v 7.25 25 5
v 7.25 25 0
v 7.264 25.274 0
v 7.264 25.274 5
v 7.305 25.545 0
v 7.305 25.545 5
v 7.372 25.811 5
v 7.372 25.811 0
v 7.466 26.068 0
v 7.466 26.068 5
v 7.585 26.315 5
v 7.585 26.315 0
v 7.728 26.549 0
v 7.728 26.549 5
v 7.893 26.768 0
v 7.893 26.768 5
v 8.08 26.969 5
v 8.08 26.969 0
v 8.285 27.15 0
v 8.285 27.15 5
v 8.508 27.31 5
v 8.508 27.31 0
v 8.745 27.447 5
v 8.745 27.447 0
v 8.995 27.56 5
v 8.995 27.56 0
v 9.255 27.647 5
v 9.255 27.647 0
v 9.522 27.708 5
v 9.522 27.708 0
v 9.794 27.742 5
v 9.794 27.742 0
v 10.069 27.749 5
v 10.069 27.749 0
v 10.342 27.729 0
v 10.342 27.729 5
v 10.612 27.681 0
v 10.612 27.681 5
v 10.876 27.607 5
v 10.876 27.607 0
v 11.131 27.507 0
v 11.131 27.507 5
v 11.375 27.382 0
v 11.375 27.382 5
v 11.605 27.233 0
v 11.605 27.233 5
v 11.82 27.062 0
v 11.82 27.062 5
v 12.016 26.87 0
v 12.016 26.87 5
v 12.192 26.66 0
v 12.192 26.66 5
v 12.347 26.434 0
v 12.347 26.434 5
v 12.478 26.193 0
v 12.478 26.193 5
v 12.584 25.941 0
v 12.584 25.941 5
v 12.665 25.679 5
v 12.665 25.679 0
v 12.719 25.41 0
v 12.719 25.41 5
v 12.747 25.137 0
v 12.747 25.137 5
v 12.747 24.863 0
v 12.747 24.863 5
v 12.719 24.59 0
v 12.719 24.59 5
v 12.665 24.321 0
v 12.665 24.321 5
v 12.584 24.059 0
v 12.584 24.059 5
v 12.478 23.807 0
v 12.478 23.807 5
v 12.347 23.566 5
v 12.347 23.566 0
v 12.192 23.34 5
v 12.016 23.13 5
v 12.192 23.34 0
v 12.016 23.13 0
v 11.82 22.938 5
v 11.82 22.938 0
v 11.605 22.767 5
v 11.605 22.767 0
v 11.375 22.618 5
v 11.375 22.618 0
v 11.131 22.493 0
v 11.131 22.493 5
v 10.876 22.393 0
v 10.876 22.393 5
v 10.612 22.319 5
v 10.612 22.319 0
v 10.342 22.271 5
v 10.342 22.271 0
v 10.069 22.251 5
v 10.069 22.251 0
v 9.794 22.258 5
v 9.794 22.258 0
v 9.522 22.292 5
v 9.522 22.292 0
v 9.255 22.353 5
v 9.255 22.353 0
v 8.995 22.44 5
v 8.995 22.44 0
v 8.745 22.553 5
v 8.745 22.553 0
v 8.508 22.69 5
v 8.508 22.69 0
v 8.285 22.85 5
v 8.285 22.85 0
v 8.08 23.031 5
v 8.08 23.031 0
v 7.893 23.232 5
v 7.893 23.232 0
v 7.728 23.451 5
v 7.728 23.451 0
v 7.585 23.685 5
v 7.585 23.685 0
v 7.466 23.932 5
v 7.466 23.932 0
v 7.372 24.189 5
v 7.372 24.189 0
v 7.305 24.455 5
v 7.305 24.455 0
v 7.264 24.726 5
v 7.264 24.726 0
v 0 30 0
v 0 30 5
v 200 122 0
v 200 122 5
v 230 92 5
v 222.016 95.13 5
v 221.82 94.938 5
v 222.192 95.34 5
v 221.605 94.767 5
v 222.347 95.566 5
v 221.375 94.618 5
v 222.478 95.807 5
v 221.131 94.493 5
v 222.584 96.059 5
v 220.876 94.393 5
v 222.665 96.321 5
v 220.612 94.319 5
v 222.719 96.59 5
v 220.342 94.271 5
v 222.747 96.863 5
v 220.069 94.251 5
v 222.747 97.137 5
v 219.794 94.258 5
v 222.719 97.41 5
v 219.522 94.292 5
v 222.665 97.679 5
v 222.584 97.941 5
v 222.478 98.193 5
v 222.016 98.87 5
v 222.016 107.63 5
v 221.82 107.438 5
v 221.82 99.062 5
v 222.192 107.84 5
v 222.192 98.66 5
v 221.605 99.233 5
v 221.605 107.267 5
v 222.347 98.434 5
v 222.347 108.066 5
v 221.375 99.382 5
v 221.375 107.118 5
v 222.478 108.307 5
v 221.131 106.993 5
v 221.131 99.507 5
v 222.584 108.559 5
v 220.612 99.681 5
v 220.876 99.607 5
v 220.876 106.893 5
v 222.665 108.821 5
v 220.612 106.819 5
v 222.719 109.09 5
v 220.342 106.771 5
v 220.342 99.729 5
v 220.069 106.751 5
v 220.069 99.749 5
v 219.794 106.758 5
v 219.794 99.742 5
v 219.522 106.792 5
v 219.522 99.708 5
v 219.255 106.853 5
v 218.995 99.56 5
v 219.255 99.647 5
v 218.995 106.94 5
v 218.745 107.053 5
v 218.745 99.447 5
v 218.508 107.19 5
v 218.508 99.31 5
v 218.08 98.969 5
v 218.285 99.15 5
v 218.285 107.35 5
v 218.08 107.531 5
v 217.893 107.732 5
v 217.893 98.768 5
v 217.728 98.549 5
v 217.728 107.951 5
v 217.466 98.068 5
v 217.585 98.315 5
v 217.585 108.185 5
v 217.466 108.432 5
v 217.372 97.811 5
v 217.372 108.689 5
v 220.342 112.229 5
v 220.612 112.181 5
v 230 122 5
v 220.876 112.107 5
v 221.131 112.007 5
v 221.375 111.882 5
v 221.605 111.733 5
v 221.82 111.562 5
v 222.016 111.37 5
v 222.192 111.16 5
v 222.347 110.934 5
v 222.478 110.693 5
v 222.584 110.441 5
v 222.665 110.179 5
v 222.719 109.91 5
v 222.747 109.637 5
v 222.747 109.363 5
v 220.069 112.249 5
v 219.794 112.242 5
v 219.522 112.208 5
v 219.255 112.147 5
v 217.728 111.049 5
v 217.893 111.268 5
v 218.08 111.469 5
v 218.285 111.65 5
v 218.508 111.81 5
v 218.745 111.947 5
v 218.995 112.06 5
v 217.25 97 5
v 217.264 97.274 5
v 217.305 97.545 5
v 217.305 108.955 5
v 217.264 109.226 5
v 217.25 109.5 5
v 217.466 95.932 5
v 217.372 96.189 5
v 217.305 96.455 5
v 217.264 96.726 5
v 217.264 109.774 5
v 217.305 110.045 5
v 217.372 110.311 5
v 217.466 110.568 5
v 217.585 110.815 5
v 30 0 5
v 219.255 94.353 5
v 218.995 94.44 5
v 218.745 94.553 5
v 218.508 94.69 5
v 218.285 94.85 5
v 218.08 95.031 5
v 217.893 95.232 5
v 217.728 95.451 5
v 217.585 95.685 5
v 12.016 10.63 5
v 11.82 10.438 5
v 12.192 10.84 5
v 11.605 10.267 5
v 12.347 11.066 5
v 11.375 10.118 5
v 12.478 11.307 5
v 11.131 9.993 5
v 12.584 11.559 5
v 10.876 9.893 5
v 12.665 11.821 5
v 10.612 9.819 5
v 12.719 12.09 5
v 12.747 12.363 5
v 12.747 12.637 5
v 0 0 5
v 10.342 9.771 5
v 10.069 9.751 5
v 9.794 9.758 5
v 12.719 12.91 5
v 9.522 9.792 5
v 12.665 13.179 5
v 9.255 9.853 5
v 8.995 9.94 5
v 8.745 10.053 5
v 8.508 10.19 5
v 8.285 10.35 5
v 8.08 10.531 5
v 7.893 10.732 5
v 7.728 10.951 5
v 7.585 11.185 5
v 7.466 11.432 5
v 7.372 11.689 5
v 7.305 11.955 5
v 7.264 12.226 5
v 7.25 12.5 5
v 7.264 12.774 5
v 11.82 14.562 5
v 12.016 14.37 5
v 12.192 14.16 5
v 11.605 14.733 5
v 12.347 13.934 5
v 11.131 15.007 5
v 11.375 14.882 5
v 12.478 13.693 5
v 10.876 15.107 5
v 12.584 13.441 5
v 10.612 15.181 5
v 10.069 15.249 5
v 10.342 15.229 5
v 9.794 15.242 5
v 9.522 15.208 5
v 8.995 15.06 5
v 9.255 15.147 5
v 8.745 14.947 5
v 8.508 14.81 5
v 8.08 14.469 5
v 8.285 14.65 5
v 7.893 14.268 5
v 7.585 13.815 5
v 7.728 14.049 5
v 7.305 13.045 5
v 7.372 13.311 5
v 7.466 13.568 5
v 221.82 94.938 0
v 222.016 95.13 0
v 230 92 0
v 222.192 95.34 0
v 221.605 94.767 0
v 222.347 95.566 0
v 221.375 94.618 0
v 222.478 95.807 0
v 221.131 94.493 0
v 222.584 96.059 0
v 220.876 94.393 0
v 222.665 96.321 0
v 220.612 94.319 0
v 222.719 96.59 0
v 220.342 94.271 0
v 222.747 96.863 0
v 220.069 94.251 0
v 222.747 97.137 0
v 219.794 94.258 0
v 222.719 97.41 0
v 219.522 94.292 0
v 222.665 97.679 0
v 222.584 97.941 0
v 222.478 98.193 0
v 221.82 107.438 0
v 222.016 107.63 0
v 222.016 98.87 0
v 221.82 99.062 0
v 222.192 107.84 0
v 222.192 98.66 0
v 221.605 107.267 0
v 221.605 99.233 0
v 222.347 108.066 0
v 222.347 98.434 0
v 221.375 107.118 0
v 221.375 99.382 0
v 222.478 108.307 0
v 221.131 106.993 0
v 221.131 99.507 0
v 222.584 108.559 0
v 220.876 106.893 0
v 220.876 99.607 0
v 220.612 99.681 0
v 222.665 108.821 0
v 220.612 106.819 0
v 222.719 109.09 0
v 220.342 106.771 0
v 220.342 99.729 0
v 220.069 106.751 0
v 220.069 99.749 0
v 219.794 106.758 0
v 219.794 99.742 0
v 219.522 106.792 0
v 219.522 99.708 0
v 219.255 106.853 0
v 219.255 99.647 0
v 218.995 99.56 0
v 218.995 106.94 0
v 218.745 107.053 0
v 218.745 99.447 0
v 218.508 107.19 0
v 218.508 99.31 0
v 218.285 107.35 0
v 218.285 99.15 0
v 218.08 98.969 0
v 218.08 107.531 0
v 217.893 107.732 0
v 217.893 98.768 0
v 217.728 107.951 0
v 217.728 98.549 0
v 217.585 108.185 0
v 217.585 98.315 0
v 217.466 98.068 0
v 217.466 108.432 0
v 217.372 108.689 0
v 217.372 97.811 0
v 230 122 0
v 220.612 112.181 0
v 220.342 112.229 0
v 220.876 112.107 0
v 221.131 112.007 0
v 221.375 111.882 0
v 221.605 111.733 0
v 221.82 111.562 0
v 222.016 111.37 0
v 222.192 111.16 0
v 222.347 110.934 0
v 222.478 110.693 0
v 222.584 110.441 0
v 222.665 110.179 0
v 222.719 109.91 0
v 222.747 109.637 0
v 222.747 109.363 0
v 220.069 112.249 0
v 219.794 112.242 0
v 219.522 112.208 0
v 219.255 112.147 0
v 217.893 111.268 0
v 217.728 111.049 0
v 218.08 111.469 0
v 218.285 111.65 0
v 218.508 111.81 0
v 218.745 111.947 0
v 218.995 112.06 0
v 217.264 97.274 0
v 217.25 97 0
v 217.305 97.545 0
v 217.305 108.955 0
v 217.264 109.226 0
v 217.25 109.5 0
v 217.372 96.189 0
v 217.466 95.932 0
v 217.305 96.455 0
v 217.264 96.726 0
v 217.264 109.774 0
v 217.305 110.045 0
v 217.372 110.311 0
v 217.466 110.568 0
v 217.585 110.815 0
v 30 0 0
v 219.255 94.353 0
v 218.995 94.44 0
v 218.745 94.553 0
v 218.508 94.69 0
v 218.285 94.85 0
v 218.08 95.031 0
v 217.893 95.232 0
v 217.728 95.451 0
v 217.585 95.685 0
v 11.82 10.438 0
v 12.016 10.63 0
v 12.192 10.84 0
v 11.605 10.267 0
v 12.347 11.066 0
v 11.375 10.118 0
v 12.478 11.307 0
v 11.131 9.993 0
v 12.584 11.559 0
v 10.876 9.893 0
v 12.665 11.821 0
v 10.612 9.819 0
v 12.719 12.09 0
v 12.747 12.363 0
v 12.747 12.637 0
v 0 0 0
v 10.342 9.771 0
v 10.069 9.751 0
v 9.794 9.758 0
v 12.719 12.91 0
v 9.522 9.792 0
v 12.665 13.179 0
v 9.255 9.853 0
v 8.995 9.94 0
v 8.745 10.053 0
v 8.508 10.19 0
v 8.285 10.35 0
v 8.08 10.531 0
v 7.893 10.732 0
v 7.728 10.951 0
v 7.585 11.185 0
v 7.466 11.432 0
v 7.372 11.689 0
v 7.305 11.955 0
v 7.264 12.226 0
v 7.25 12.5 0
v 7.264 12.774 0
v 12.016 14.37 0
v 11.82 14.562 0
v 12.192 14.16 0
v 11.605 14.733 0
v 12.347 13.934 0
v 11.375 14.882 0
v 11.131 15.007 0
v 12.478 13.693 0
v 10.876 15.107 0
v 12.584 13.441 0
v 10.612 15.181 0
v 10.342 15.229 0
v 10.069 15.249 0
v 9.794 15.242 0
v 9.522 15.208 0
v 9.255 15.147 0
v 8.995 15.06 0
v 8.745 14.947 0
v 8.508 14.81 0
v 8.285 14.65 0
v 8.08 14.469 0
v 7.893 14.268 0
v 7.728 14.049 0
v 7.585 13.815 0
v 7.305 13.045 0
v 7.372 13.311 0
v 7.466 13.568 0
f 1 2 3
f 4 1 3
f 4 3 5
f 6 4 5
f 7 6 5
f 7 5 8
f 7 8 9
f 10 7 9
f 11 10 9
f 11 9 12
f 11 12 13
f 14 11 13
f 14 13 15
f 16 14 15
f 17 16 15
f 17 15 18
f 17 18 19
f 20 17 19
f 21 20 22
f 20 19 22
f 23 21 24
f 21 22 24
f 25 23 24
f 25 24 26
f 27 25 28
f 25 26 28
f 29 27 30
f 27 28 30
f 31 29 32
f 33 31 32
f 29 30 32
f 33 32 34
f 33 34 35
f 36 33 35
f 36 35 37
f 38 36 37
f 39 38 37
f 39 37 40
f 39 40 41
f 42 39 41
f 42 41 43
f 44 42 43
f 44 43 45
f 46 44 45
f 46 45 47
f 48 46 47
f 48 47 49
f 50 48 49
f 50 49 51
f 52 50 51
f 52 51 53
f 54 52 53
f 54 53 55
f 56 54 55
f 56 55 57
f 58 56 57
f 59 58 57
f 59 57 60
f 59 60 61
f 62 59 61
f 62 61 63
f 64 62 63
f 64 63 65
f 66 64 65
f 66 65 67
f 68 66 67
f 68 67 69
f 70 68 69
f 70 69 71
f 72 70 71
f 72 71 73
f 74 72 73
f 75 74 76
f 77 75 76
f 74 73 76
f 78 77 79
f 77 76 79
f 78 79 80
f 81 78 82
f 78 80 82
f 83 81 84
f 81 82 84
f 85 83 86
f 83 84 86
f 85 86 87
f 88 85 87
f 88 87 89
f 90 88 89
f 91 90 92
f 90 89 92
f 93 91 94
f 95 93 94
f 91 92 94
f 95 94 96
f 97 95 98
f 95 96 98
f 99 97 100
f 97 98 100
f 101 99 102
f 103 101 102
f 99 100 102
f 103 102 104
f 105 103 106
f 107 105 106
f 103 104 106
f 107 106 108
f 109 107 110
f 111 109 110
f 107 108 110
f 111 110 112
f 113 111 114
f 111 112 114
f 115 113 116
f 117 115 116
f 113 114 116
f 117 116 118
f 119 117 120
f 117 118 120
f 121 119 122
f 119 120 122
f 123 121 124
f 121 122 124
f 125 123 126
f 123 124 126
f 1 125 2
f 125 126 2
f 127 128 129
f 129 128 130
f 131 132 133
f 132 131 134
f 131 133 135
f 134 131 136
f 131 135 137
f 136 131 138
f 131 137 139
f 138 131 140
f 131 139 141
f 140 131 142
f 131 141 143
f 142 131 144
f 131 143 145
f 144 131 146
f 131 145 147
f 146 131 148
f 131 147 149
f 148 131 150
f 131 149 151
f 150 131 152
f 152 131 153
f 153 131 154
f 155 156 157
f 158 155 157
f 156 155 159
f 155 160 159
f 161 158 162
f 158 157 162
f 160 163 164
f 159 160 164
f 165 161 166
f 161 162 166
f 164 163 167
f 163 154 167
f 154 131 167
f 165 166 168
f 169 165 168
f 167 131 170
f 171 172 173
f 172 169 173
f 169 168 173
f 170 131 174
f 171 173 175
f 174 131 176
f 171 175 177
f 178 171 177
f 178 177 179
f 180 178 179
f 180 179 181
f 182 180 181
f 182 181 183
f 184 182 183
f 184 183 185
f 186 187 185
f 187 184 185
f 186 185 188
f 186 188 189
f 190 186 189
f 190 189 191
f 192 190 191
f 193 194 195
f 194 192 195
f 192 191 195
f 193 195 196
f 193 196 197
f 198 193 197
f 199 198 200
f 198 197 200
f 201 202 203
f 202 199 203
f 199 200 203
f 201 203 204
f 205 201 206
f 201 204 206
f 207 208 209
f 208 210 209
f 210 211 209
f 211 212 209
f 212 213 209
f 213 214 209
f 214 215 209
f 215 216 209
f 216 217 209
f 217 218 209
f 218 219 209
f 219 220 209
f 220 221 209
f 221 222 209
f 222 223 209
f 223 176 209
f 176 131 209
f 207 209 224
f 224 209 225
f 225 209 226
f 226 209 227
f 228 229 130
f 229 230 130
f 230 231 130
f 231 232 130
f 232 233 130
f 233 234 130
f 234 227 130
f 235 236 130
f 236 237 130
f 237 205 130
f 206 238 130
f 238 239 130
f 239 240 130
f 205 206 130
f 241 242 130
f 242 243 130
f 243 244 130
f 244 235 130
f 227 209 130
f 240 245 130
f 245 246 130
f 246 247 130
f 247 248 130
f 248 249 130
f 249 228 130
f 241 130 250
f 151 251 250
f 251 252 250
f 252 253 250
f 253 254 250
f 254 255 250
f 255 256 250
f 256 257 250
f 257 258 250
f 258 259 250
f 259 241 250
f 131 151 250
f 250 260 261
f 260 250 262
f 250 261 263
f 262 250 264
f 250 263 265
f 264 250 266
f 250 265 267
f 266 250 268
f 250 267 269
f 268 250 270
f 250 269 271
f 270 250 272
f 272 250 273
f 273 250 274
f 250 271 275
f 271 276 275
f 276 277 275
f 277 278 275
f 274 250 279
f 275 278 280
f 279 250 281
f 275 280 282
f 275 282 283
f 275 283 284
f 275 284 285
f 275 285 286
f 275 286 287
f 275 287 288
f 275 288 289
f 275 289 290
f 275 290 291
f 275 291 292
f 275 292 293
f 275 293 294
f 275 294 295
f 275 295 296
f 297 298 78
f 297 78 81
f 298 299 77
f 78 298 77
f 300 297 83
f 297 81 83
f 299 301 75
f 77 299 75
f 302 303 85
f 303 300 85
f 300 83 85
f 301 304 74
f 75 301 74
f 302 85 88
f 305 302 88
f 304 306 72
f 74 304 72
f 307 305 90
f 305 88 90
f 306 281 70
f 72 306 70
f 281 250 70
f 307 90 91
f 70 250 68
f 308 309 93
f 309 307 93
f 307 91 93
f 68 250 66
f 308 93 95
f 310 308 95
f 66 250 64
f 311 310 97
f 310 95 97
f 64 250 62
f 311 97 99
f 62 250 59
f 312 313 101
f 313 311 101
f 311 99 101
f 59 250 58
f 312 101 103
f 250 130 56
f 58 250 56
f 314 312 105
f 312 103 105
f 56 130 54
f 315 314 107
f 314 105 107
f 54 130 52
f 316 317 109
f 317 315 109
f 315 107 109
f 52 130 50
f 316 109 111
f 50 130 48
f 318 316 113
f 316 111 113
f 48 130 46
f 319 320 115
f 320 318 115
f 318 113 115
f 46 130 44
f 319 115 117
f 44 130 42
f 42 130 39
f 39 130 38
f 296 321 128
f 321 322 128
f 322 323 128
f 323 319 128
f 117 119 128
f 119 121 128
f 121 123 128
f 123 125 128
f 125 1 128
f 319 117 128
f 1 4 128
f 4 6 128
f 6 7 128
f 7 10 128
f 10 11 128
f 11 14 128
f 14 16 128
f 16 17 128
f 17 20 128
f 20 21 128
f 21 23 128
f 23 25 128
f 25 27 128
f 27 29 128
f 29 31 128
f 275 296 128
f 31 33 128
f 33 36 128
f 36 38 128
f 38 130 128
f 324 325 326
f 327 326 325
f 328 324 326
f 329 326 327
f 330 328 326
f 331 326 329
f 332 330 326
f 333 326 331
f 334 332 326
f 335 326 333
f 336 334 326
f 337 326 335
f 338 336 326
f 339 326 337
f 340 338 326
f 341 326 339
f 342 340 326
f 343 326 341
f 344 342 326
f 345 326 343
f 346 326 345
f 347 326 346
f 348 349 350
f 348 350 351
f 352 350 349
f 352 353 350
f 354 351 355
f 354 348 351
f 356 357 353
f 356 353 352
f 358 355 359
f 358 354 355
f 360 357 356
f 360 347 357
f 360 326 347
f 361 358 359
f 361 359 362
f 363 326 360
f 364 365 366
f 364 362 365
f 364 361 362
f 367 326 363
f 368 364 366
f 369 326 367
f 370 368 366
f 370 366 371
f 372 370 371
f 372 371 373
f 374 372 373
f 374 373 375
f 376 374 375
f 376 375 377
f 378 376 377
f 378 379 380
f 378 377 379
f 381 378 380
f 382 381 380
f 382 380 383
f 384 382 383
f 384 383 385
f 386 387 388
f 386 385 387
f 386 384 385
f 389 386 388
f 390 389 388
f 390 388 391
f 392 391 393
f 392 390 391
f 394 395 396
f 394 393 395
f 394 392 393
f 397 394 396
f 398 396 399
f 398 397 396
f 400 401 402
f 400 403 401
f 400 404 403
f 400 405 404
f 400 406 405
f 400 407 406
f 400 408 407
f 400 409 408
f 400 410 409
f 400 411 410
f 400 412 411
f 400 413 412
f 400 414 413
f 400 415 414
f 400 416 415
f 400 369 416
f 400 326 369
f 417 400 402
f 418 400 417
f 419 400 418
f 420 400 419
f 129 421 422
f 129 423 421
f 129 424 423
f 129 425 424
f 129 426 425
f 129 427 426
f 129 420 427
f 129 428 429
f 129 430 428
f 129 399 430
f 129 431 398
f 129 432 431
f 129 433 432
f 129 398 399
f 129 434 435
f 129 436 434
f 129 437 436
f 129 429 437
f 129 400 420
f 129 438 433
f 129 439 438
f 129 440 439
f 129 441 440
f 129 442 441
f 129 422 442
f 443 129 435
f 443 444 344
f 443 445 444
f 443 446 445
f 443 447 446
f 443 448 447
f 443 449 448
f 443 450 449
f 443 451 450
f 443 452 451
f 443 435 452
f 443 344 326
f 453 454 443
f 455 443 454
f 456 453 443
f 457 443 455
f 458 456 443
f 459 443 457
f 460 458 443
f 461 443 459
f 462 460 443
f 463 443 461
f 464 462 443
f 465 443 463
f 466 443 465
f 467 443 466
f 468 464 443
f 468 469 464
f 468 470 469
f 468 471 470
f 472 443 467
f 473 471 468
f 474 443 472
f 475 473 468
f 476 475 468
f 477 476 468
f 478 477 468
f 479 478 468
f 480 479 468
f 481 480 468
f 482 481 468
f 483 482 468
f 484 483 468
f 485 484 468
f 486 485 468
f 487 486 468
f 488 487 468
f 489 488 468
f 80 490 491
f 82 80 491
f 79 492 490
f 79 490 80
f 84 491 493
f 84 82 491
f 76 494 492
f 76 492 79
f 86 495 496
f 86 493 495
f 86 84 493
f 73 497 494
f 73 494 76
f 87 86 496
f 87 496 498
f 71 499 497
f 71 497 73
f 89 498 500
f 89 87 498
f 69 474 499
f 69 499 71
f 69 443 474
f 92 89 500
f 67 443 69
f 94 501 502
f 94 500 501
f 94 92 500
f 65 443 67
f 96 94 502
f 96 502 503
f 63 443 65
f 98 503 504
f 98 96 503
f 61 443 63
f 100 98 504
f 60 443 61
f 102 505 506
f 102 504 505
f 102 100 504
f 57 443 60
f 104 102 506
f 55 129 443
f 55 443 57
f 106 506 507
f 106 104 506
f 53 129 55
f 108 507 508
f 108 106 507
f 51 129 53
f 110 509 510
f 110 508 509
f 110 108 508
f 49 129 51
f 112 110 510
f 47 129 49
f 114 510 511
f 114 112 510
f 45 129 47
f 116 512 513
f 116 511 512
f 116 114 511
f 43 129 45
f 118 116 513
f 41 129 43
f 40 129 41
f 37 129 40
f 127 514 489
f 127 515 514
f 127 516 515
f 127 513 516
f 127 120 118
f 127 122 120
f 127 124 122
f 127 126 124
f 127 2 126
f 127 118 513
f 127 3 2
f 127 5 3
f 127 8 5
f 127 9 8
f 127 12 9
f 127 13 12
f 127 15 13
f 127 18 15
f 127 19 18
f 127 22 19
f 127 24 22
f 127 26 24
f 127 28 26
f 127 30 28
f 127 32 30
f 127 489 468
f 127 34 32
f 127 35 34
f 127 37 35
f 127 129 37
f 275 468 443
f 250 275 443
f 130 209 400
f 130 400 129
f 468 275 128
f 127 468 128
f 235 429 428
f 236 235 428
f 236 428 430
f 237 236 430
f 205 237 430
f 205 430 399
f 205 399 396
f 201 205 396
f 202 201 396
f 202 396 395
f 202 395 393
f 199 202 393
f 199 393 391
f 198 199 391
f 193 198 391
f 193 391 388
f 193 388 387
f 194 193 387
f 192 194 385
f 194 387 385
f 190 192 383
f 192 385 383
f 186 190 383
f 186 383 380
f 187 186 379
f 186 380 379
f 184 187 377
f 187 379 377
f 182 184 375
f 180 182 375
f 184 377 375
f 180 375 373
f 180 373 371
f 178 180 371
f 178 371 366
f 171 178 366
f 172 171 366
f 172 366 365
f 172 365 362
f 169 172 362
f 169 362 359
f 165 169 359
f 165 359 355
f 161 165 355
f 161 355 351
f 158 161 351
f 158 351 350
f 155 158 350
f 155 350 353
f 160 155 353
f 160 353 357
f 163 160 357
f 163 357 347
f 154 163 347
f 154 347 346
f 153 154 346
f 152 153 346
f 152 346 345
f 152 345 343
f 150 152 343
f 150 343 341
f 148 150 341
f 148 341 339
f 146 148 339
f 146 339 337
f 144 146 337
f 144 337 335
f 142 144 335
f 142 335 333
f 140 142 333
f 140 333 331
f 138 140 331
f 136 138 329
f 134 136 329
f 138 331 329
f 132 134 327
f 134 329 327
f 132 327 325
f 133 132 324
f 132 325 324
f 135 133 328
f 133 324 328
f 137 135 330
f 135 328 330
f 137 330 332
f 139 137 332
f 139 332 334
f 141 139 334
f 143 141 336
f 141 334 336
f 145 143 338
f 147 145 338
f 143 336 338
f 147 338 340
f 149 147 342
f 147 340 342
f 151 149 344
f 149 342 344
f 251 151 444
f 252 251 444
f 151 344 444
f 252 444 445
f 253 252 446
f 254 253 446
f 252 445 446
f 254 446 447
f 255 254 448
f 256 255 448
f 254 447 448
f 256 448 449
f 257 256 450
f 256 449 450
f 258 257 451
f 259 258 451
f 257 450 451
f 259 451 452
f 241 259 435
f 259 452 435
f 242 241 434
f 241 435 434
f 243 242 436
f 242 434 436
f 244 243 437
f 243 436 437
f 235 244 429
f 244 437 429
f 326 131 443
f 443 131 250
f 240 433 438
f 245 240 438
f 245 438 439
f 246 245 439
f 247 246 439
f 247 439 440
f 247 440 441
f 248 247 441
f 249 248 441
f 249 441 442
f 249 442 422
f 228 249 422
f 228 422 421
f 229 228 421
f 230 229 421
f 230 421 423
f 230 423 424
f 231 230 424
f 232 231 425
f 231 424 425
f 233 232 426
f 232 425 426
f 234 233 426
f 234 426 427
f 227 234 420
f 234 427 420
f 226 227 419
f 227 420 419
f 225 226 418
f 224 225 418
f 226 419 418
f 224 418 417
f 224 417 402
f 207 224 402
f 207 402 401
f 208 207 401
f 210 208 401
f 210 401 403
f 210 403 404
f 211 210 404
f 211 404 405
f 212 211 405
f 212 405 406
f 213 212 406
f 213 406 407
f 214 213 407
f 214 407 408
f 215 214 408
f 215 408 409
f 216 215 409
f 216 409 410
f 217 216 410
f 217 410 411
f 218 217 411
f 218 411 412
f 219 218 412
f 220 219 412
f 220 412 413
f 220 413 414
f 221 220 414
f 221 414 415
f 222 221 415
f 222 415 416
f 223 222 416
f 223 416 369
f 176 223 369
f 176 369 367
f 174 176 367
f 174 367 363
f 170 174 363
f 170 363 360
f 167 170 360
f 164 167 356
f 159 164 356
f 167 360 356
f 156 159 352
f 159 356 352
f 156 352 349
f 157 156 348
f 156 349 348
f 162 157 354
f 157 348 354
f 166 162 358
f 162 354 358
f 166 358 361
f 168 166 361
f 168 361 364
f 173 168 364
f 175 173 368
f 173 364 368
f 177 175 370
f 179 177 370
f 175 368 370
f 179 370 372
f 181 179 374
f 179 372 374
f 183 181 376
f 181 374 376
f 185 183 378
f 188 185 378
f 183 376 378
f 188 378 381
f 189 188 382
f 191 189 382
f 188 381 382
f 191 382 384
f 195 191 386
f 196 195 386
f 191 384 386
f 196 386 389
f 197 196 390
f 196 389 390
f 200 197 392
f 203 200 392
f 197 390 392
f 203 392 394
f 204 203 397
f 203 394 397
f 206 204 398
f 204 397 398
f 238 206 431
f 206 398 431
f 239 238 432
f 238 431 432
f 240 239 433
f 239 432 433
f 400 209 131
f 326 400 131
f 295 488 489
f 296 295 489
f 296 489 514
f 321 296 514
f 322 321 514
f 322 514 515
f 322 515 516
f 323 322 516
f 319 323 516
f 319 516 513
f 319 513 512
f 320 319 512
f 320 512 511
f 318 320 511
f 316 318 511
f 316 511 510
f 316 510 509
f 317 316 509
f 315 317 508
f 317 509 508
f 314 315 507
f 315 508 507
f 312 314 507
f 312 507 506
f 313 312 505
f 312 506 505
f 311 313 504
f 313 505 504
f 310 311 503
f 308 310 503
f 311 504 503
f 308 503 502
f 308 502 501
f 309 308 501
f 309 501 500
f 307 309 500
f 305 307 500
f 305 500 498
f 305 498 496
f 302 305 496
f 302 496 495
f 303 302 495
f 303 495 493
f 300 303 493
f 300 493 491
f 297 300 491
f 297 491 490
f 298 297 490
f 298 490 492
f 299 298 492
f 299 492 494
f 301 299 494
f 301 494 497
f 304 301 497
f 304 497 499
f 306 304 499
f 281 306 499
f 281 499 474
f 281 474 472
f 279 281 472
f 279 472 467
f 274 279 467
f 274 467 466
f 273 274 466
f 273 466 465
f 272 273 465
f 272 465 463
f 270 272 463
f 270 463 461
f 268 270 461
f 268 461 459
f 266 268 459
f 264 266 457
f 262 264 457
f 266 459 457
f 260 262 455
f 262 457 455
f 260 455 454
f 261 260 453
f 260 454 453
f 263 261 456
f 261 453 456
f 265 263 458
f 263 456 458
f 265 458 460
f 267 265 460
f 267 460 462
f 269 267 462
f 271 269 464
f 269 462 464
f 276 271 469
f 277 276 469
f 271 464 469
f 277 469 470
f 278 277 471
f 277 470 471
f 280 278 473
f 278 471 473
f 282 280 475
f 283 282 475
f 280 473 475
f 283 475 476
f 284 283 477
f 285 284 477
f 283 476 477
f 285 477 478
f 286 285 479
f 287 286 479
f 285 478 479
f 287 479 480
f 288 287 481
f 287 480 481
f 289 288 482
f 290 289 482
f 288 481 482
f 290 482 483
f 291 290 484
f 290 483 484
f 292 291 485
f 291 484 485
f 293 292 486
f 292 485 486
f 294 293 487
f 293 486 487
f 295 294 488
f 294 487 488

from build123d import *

# Parameters (mm, degrees)
BOSS_EXTRUDE1_DEPTH  = 5
BOSS_EXTRUDE2_DEPTH  = 5
M5_CLEARANCE_HOLE1_D = 5.5


with BuildPart() as part:
    # Sketch1 → Boss-Extrude1 (new body)
    with BuildSketch(Plane.XY):
        Polygon((0, 0), (20, 0), (230, 122), (210, 122), align=None)
    extrude(amount=BOSS_EXTRUDE1_DEPTH)

    # Sketch2 → Boss-Extrude2 (add)
    with BuildSketch(Plane.XY.offset(5)):
        Polygon((0, 0), (0, 30), (200, 122), (210, 122), (230, 122), (230, 92), (30, 0), align=None)
    extrude(amount=-BOSS_EXTRUDE2_DEPTH)

    # M5 Clearance Hole1 (through all)
    with Locations(Plane.XY.offset(5)):
        with Locations((10, 25), (220, 97), (10, 12.5), (220, 109.5)):
            Hole(M5_CLEARANCE_HOLE1_D / 2)


solid = part.part
